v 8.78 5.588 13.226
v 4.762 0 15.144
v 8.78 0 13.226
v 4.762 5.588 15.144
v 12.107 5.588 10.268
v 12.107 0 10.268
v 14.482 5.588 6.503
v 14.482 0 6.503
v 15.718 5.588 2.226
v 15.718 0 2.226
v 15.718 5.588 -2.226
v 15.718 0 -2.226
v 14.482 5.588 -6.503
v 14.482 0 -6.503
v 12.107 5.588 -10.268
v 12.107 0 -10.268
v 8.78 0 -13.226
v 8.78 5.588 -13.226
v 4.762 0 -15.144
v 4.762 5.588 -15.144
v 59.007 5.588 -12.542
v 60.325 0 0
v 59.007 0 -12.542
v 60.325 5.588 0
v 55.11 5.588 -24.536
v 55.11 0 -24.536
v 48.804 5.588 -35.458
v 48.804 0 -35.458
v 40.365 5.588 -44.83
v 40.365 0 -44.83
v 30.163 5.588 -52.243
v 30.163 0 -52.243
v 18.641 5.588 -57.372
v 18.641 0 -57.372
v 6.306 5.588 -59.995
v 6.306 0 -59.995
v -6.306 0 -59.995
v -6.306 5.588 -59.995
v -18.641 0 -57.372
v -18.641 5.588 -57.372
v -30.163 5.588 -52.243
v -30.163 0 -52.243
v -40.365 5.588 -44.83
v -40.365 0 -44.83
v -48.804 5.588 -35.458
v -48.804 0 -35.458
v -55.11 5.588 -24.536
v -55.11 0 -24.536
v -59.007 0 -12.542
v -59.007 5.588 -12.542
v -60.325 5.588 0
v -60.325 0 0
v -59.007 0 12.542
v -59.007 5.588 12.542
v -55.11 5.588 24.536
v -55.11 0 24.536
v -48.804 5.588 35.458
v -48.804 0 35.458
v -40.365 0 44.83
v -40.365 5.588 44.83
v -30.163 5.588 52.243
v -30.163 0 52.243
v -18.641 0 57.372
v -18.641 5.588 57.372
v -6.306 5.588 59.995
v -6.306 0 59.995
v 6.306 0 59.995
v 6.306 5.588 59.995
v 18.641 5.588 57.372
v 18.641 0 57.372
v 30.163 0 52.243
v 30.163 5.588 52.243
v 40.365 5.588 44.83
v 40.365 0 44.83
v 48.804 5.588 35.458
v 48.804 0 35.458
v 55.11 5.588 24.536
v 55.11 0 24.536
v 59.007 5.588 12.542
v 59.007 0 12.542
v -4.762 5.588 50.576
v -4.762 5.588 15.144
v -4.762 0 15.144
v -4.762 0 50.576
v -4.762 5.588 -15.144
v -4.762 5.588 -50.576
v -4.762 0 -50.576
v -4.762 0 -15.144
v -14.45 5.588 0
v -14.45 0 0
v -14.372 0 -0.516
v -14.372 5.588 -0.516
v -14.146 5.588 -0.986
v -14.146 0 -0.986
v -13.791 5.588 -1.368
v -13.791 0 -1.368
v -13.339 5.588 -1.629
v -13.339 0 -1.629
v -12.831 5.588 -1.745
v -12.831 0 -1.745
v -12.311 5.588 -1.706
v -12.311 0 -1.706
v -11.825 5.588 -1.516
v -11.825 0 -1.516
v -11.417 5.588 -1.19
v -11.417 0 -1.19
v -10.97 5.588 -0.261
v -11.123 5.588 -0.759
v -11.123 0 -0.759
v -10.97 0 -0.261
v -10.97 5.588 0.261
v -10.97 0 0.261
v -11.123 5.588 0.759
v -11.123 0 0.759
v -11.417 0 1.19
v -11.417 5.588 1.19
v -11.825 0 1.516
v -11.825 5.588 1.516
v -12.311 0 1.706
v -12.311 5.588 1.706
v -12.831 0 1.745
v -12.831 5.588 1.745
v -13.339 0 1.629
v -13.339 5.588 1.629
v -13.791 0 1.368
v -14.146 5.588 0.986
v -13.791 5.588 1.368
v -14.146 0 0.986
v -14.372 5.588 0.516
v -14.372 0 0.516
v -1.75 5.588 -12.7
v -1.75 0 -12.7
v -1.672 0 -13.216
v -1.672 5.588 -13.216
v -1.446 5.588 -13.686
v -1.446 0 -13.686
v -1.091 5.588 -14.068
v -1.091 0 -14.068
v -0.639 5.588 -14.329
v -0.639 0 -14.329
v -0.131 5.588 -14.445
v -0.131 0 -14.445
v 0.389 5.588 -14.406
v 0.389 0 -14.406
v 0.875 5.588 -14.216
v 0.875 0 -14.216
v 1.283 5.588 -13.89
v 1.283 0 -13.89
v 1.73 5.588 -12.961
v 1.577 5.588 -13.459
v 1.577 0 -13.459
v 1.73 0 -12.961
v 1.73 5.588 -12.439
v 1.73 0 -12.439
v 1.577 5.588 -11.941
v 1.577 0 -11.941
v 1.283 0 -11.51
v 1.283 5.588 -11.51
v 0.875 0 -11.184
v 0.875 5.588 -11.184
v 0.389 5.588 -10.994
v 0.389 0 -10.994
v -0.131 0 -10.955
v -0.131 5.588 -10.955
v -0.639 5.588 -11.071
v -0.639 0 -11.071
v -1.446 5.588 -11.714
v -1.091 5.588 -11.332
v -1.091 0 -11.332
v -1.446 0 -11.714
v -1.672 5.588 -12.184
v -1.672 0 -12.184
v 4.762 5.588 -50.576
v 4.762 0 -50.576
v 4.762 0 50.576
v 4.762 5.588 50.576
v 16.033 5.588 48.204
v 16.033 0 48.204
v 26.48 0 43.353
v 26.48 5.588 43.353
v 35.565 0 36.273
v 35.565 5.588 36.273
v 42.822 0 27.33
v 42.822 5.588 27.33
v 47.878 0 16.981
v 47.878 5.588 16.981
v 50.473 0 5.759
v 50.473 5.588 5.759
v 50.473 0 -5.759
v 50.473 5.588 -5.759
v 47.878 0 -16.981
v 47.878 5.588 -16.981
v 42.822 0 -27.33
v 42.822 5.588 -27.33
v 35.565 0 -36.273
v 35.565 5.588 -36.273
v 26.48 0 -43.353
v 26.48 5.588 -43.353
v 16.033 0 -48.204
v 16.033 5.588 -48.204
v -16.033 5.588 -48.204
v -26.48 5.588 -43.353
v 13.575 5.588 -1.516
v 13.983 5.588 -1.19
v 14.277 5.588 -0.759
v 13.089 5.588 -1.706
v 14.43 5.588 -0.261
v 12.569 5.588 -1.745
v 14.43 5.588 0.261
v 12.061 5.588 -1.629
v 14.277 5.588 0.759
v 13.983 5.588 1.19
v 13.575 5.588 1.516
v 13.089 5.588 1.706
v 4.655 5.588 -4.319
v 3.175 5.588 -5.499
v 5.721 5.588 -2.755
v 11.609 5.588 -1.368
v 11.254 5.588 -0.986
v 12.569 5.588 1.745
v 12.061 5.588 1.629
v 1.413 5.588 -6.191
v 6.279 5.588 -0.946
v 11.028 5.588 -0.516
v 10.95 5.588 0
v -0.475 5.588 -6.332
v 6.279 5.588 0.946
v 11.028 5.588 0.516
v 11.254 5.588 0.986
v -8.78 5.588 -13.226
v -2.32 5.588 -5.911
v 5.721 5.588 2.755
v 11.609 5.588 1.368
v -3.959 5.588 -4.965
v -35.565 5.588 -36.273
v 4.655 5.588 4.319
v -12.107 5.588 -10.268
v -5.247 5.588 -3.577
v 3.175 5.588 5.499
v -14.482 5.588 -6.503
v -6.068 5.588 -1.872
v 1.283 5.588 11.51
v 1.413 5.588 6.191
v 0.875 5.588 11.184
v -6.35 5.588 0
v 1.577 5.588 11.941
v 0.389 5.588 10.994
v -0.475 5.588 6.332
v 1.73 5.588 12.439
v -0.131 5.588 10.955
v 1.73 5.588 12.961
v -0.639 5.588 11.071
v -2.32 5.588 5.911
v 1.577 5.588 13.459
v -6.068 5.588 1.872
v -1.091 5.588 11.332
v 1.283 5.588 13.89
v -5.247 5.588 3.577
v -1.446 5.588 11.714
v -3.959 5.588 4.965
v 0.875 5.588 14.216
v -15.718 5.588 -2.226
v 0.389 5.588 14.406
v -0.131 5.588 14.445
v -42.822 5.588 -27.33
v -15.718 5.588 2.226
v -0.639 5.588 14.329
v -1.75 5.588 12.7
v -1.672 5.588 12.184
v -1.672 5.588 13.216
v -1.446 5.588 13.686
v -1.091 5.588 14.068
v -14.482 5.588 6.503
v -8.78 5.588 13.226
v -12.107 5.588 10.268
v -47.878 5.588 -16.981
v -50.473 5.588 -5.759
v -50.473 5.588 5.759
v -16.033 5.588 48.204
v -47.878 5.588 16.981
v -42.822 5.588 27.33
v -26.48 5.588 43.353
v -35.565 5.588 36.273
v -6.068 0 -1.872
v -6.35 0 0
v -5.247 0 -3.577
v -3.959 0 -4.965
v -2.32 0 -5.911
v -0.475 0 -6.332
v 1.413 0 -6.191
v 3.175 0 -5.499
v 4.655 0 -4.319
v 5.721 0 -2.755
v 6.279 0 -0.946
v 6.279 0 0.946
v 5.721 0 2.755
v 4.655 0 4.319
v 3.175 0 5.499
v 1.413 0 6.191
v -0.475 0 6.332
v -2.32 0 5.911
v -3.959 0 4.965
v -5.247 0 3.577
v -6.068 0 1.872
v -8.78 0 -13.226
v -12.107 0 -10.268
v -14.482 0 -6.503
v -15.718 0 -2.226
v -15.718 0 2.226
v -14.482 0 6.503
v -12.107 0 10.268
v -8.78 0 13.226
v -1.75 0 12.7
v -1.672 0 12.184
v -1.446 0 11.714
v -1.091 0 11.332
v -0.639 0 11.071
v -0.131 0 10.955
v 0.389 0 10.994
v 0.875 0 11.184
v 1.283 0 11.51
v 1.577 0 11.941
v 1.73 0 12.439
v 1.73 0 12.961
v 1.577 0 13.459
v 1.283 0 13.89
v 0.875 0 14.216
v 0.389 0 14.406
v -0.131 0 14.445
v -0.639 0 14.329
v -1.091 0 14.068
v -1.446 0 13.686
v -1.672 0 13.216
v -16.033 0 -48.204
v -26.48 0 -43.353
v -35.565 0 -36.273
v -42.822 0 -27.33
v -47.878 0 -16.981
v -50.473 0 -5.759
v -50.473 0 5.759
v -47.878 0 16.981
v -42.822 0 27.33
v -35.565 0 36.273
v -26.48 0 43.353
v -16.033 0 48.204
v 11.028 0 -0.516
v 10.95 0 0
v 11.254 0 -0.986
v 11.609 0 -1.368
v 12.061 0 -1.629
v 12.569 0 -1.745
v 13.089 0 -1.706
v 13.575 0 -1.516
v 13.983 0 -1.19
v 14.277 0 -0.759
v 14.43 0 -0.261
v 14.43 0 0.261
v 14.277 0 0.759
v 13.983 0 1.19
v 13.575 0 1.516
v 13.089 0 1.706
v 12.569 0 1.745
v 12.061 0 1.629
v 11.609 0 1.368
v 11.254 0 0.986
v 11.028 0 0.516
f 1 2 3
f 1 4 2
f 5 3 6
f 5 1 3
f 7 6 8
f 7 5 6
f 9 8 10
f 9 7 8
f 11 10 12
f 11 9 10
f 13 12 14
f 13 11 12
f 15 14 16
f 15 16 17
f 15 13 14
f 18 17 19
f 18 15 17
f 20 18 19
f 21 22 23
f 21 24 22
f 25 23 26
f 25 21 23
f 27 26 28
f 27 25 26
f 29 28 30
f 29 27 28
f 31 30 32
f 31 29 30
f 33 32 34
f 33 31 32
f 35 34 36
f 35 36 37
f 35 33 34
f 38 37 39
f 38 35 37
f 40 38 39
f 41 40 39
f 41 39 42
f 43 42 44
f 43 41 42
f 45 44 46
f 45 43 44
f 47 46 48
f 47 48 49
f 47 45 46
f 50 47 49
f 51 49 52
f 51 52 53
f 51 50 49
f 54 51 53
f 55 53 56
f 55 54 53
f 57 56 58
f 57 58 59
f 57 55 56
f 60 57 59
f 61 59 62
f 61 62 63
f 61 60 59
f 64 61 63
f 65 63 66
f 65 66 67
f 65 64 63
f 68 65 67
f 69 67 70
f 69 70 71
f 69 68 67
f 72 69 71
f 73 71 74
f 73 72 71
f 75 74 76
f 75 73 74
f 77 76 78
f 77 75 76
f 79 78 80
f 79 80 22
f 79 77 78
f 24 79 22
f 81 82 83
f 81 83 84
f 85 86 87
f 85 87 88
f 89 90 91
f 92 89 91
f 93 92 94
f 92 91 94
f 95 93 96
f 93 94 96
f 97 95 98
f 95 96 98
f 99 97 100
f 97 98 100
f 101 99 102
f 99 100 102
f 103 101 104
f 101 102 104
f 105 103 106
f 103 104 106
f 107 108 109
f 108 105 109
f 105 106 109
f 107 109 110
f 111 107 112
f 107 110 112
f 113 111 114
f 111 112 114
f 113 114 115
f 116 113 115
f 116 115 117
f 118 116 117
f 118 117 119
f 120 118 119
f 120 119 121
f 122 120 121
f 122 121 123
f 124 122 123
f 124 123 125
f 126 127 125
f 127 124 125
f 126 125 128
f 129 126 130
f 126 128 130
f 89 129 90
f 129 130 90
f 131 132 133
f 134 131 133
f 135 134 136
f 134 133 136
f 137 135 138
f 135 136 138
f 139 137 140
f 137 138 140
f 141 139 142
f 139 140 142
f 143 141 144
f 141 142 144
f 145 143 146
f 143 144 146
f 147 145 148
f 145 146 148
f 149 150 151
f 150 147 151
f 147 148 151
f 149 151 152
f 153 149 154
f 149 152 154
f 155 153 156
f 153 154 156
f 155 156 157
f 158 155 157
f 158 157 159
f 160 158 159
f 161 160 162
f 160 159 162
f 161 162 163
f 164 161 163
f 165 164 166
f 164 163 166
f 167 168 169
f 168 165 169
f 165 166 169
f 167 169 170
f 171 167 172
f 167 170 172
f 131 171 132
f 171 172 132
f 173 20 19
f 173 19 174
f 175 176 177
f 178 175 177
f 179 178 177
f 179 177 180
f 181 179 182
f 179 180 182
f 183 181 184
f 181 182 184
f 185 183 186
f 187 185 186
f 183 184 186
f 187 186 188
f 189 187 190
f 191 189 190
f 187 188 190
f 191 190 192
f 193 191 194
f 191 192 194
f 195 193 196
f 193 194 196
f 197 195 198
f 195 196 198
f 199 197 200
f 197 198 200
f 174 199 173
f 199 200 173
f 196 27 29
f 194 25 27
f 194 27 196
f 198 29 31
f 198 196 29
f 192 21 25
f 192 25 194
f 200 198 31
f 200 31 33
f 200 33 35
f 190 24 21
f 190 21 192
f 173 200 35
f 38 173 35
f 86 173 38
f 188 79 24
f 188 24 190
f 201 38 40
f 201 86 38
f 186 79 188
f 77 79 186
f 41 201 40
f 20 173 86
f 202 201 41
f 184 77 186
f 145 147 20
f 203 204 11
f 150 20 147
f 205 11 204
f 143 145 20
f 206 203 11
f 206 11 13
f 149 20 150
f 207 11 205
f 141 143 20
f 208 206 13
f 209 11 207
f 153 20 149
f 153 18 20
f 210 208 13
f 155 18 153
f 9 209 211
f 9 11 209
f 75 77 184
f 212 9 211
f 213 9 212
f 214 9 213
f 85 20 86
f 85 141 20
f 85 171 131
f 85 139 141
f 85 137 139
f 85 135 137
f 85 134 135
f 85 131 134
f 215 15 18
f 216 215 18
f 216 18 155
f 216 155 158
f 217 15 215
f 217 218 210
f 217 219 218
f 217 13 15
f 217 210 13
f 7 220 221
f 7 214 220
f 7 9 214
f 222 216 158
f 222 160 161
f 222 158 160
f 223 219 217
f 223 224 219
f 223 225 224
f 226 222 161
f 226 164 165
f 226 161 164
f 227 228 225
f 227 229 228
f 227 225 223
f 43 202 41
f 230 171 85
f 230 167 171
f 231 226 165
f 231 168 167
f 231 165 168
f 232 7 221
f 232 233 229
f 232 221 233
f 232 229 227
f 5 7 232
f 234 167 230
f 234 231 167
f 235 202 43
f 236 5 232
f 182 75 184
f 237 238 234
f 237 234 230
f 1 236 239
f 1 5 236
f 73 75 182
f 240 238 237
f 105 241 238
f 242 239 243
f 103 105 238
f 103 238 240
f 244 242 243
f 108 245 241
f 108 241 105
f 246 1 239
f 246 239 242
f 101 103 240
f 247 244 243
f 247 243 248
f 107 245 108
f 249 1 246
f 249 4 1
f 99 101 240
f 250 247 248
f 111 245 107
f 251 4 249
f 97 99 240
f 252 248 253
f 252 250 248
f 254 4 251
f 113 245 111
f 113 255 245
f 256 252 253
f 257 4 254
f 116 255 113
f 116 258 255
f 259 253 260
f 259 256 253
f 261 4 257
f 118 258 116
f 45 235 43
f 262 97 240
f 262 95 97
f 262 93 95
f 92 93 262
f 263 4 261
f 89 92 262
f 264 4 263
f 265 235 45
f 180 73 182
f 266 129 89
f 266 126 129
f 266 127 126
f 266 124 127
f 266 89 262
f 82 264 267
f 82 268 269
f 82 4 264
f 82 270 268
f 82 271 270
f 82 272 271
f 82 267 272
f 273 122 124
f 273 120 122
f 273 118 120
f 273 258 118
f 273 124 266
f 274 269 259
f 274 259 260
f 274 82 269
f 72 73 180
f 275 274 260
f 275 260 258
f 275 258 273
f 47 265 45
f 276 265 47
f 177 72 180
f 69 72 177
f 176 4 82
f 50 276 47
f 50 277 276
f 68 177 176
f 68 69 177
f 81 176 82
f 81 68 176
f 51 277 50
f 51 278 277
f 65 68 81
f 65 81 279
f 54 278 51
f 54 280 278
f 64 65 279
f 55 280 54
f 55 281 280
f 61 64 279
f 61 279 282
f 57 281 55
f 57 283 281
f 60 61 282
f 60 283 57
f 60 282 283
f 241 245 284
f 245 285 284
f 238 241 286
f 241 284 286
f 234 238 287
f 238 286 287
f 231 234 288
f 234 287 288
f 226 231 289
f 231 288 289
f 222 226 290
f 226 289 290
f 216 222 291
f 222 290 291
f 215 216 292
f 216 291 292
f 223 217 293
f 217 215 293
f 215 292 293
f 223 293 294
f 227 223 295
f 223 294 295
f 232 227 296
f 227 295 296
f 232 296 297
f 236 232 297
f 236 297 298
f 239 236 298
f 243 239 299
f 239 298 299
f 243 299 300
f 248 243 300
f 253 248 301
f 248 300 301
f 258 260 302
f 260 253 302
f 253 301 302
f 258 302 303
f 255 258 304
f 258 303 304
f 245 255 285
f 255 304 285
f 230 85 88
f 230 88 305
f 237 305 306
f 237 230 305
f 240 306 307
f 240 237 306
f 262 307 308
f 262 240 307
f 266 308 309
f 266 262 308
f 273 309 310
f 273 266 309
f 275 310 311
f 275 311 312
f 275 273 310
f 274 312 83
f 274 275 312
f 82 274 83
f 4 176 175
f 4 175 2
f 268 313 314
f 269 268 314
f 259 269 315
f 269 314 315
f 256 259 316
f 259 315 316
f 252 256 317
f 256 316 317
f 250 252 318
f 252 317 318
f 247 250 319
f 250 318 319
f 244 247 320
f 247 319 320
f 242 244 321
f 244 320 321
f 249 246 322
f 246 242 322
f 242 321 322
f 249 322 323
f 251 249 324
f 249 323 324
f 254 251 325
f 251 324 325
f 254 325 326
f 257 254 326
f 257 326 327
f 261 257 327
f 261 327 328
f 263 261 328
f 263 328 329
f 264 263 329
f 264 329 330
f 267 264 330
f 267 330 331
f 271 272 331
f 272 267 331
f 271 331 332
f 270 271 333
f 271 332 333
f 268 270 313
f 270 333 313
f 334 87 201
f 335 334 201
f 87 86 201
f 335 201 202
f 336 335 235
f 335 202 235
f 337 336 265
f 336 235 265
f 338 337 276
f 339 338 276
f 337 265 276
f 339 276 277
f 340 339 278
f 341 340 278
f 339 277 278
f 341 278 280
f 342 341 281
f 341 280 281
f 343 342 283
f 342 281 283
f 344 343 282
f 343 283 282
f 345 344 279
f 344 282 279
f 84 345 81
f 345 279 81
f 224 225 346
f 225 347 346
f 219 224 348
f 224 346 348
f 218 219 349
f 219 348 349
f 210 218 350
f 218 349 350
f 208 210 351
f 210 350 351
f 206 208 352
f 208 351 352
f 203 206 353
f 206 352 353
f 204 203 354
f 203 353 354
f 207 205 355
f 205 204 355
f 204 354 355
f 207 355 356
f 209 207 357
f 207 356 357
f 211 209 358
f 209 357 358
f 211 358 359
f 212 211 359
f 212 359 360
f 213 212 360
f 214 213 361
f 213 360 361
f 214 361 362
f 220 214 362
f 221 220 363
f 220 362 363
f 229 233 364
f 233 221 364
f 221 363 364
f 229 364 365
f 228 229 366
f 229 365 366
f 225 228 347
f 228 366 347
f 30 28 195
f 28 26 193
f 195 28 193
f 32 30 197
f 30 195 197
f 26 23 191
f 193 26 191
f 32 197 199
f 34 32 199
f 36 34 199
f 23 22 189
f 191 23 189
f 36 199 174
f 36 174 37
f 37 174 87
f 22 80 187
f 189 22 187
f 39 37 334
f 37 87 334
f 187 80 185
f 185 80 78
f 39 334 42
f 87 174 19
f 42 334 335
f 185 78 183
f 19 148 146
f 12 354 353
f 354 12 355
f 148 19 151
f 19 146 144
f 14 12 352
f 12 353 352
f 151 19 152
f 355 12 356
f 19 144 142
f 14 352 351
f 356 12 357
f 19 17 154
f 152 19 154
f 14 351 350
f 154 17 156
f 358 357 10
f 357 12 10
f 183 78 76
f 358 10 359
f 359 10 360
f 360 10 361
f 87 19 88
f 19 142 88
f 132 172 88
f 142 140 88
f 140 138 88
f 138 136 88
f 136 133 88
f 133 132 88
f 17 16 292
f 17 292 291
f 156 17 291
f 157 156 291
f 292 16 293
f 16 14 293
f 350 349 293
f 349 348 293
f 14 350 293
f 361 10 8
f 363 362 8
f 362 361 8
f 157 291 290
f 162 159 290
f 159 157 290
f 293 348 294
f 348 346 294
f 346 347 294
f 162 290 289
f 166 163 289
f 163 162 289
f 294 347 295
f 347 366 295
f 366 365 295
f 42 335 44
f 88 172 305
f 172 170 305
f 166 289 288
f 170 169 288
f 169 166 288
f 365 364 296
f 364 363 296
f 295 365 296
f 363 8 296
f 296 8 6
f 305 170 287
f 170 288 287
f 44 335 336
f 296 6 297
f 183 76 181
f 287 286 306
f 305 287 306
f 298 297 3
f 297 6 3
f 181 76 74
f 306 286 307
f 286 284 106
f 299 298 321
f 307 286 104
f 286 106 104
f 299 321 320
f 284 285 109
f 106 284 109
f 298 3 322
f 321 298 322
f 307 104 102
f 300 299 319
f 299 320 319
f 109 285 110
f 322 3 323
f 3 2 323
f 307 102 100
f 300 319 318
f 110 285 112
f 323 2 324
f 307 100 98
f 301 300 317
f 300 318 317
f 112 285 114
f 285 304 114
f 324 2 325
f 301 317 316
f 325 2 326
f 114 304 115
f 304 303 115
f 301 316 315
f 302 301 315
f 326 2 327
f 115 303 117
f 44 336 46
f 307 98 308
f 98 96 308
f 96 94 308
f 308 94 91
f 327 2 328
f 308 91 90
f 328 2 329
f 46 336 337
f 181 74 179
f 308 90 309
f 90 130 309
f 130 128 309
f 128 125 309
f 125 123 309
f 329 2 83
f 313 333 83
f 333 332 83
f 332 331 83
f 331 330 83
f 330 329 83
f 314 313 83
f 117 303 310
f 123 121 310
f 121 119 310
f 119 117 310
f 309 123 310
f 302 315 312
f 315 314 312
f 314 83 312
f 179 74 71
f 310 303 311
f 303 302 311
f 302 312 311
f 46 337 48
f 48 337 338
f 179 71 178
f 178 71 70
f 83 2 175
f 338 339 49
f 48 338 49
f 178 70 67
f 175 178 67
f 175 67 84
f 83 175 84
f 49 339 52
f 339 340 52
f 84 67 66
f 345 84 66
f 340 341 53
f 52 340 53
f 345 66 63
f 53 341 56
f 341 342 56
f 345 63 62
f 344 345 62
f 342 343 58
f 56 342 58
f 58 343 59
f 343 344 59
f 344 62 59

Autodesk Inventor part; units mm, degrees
ref_plane "YZ Plane" through (0, 0, 0) normal (1, 0, 0) x (0, 1, 0)
ref_plane "XZ Plane" through (0, 0, 0) normal (0, 1, 0) x (-1, 0, 0)
ref_plane "XY Plane" through (0, 0, 0) normal (0, 0, 1) x (1, 0, 0)
sketch "Sketch1" plane through (0, 0, 0) normal (0, 1, 0) x (-1, 0, 0)
  circle A0 centre (0, 0) radius 63.5
  circle A1 centre (0, 0) radius 6.35
  circle A2 centre (-12.7, 0) radius 1.75
  circle A3 centre (0, -12.7) radius 1.75
  circle A4 centre (12.7, 0) radius 1.75
  circle A5 centre (0, 12.7) radius 1.75
  dimension "d8" = 3.5
  dimension "d9" = 3.5
  dimension "d10" = 3.5
  dimension "d11" = 3.5
extrude "Extrusion1" add sketch "Sketch1" along normal blind 5.588
sketch "Sketch2" plane through (0, 5.588, 0) normal (0, 1, 0) x (1, 0, 0)
  circle A0 centre (0, 0) radius 63.5 projected
  line L0 (-4.7625, 37.8012) -> (-4.7625, 15.1438)
  line L1 (-4.7625, -15.1438) -> (-4.7625, -37.8012)
  line L2 (4.7625, 37.8012) -> (4.7625, 15.1438)
  line L3 (4.7625, -15.1438) -> (4.7625, -37.8012)
  arc A1 (-4.7625, 15.1438) -> (-4.7625, -15.1438) centre (0, 0) ccw
  arc A2 (4.7625, -15.1438) -> (4.7625, 15.1438) centre (0, 0) ccw
  arc A3 (-4.7625, 50.5763) -> (-4.7625, -50.5763) centre (0, 0) ccw
  arc A4 (4.7625, -50.5763) -> (4.7625, 50.5763) centre (0, 0) ccw
  line L4 (-4.7625, 50.5763) -> (-4.7625, 15.1438)
  line L5 (-4.7625, -15.1438) -> (-4.7625, -50.5763)
  line L6 (4.7625, -50.5763) -> (4.7625, -15.1438)
  line L7 (4.7625, 15.1438) -> (4.7625, 50.5763)
extrude "Extrusion3" cut sketch "Sketch2" against normal blind 25.4 contours L0 A1 L1 L5 A3 L4 | L7 A4 L6 L3 A2 L2
sketch "Sketch3" plane through (0, 5.588, 0) normal (0, 1, 0) x (1, 0, 0)
  circle A0 centre (0, 0) radius 63.5
  circle A1 centre (0, 0) radius 60.325
  dimension "d24" = 120.65
extrude "Extrusion4" cut sketch "Sketch3" against normal blind 25.4
properties part number "AcrylicFlywheel3"
